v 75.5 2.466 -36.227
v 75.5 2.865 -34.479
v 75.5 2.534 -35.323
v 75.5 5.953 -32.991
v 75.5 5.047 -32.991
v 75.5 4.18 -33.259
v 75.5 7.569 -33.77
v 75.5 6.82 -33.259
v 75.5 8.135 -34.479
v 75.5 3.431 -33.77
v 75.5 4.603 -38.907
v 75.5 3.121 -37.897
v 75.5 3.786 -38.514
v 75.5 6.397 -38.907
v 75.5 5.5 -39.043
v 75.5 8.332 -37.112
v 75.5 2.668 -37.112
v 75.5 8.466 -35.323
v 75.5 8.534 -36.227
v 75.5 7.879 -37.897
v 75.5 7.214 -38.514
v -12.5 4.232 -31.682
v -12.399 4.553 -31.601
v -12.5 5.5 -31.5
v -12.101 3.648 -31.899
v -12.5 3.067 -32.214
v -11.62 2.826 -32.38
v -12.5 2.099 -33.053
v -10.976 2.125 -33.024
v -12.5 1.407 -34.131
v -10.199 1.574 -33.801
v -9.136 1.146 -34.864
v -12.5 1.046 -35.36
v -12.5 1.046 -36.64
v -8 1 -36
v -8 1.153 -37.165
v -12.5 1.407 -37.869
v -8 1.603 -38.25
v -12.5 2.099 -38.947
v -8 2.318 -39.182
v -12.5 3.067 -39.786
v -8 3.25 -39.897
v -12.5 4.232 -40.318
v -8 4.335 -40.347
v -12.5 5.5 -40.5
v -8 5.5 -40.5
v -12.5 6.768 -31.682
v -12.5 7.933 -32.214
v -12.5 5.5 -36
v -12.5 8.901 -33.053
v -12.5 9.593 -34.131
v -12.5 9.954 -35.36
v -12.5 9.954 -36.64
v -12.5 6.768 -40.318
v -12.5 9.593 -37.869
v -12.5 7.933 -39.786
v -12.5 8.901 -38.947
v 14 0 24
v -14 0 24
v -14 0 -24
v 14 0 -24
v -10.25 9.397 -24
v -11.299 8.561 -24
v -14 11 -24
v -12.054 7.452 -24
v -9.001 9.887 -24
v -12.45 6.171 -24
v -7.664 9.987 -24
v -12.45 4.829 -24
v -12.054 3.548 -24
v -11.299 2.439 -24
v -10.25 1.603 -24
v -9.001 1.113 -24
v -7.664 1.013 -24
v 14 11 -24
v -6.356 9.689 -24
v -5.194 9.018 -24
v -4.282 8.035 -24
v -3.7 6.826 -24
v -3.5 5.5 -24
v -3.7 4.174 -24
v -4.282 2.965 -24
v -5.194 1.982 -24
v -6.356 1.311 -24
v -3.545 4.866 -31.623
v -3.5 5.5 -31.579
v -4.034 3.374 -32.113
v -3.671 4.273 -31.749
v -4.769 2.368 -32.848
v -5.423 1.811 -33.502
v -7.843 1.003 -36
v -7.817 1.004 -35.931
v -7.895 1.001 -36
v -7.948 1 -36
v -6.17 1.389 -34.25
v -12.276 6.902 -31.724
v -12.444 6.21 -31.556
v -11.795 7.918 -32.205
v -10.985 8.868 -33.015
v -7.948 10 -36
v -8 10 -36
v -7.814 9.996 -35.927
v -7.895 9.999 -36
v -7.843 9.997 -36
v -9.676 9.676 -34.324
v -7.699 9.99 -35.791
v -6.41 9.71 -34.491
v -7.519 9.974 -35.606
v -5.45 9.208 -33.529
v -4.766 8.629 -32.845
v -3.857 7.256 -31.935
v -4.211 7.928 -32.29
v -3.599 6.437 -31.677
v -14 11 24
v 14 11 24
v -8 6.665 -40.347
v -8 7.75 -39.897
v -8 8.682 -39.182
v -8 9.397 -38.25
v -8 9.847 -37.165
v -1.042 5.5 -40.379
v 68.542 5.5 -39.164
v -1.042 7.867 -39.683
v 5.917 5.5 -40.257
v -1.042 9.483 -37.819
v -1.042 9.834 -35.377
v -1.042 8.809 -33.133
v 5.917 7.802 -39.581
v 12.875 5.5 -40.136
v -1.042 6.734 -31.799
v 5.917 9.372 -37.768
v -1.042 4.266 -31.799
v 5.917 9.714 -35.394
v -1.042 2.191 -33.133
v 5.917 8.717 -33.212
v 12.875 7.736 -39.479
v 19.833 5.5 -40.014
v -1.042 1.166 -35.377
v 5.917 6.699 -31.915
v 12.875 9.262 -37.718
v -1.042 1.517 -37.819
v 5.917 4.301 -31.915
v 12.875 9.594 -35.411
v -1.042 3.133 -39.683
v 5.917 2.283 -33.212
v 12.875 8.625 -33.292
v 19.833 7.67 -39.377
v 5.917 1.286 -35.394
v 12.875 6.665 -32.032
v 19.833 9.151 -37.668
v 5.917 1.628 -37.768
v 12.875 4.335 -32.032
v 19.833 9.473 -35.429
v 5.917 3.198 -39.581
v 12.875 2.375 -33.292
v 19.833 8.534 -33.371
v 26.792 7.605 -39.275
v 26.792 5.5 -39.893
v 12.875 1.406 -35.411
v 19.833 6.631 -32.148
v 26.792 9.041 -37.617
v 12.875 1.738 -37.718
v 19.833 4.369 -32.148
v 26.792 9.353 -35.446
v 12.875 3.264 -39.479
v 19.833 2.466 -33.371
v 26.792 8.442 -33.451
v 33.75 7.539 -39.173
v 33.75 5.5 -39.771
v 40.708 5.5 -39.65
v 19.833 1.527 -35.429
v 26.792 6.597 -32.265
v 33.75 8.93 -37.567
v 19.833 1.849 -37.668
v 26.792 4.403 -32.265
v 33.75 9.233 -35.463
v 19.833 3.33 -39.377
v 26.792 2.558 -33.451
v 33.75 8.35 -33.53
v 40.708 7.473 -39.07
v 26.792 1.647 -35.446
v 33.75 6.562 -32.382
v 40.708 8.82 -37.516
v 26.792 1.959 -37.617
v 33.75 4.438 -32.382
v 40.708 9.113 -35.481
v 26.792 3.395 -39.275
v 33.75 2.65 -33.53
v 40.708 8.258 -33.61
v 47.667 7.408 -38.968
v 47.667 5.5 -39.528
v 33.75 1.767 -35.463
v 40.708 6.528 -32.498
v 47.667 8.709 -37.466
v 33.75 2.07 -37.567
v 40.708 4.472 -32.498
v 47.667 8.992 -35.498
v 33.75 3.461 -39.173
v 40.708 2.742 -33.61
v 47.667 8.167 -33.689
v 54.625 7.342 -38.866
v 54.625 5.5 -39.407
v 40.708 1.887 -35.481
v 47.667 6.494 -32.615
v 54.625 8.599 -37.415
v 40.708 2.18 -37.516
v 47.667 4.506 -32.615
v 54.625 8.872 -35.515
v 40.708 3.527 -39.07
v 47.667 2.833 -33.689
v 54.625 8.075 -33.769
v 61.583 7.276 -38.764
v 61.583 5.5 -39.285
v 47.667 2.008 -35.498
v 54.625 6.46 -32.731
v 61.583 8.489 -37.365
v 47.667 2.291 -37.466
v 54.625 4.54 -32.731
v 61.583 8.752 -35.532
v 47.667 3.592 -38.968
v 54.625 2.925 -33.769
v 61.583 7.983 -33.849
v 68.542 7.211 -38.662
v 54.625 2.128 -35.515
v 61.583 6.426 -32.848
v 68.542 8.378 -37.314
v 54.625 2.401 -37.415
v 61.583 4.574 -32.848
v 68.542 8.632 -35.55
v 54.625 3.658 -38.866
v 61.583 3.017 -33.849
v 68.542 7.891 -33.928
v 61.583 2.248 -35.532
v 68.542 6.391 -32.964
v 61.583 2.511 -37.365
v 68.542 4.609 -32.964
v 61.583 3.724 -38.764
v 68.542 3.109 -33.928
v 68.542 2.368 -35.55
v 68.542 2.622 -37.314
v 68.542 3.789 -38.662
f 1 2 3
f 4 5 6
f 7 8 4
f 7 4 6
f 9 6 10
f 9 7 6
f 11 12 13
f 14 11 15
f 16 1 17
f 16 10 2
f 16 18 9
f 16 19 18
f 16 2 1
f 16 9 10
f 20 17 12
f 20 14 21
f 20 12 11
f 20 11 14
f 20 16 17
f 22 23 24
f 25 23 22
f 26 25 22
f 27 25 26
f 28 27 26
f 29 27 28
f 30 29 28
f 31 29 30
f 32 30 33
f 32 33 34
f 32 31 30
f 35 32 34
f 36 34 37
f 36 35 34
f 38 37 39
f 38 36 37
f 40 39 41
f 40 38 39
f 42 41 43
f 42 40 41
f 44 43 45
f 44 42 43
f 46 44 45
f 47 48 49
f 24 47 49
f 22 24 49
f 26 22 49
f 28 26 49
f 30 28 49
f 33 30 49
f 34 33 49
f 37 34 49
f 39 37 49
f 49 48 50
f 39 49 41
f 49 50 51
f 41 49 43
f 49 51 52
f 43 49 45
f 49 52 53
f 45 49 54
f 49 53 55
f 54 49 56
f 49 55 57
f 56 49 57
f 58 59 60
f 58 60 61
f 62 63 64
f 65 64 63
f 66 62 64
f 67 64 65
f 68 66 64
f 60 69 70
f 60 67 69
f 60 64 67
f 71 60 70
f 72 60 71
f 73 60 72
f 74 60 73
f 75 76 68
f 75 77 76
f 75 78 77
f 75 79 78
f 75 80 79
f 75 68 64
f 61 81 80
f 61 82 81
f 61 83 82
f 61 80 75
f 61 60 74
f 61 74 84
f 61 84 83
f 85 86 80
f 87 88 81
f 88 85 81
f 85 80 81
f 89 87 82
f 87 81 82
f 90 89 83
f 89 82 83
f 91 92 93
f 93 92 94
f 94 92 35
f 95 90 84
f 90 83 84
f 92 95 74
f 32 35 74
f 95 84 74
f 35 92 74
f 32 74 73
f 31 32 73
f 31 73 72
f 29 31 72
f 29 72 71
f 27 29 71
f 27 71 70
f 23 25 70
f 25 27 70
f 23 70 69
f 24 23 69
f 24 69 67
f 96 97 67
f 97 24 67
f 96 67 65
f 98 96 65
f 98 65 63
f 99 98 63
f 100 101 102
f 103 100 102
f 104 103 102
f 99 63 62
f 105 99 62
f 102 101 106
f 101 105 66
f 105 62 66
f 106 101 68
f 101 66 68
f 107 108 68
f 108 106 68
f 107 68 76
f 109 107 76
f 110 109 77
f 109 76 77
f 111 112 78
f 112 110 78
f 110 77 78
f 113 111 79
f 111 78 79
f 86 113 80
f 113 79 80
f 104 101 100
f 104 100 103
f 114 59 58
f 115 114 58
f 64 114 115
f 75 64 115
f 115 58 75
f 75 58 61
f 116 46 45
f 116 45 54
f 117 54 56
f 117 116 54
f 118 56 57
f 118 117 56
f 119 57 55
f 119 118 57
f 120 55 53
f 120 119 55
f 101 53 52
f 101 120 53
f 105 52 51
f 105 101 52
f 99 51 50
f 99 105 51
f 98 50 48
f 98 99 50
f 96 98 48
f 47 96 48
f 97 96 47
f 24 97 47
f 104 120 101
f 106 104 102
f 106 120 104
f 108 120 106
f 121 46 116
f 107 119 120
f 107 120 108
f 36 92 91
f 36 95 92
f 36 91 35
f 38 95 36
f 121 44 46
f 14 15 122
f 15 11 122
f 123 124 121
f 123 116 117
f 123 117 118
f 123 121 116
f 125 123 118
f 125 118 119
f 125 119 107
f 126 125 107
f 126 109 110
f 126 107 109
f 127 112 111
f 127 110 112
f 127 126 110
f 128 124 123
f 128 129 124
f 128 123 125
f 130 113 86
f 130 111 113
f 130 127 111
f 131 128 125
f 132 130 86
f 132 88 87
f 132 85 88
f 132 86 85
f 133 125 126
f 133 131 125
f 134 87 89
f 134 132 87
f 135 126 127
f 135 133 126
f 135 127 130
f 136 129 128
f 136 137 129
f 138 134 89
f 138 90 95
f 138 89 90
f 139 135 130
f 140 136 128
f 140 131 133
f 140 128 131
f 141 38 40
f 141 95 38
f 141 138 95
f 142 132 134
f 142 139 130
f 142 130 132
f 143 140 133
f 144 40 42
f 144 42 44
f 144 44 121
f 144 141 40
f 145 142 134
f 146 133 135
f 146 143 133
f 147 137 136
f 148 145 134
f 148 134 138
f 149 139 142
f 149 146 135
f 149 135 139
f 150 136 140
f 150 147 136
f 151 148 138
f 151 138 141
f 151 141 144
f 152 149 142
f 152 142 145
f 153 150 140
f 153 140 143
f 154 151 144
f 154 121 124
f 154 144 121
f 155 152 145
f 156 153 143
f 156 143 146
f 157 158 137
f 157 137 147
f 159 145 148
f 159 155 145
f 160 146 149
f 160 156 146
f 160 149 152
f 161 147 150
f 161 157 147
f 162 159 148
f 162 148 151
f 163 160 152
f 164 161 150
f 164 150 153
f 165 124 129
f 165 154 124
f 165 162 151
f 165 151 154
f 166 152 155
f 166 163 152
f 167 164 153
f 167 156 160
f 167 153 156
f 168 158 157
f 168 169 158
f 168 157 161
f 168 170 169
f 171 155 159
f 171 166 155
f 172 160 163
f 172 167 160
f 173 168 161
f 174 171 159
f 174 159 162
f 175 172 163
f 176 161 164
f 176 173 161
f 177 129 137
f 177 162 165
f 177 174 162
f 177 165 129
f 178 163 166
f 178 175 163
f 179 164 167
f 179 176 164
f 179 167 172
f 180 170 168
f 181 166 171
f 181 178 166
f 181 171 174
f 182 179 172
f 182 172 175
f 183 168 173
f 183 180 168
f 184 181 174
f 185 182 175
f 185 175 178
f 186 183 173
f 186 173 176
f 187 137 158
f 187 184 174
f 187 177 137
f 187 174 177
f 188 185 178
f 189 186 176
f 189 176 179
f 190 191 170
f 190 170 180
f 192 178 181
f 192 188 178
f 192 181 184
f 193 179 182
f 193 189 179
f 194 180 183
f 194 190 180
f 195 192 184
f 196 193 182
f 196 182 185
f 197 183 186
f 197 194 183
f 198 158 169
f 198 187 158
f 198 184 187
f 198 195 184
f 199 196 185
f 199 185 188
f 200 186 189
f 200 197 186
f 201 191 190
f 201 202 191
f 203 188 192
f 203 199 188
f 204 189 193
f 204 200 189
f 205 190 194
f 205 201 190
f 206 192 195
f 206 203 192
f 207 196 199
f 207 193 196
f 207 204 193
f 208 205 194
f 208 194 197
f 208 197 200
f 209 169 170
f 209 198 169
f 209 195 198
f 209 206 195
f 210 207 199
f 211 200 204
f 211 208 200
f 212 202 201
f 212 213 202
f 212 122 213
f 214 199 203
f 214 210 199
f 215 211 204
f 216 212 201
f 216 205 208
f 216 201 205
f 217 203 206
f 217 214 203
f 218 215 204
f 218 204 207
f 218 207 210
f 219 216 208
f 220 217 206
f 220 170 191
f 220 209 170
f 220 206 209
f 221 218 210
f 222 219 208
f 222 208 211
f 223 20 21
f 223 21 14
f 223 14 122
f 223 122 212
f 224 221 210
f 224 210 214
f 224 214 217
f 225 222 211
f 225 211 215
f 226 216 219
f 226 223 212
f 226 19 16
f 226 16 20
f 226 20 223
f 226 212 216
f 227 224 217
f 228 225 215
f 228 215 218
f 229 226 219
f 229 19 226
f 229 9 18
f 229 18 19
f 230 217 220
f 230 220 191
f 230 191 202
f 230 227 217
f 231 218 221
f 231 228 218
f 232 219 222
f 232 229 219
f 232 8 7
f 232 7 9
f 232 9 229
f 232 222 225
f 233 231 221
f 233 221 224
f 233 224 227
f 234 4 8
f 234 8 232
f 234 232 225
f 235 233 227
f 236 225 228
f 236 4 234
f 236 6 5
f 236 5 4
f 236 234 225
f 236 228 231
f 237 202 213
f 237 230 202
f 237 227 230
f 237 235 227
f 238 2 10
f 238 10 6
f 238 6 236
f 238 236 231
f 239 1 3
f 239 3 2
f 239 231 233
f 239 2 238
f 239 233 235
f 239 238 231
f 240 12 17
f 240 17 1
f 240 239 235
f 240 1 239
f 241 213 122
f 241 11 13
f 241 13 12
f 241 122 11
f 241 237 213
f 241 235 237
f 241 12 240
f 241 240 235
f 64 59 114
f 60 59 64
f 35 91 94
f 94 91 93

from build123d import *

# Parameters (mm, degrees)
SCHIZZO1_W                             = 28
SCHIZZO1_H                             = 48
ESTRUSIONE_ESTRUSIONE1_DEPTH           = 11
SCHIZZO3_R                             = 4.5
ESTRUSIONE_ESTRUSIONE2_DEPTH           = 12
SCHIZZO4_R                             = 4.5
ESTRUSIONE_ESTRUSIONE3_DEPTH           = 83.5
ESTRUSIONE_ESTRUSIONE3_TAPER           = 1
ESTRUSIONE_ESTRUSIONE3_OTHER_WAY_DEPTH = 4.5


with BuildPart() as part:
    # Schizzo1 → Estrusione-Estrusione1 (new body)
    with BuildSketch(Plane(origin=(0, 0, 0), x_dir=(1, 0, 0), z_dir=(0, 1, 0))):
        Rectangle(SCHIZZO1_W, SCHIZZO1_H)
    extrude(amount=ESTRUSIONE_ESTRUSIONE1_DEPTH)

    # Schizzo3 → Estrusione-Estrusione2 (add)
    with BuildSketch(Plane(origin=(0, 0, -24), x_dir=(-1, 0, 0), z_dir=(0, 0, -1))):
        with Locations(Location((8, 5.5, 0), (0, 0, 180))):
            Circle(SCHIZZO3_R)
    extrude(amount=ESTRUSIONE_ESTRUSIONE2_DEPTH)

    # Schizzo4 → Estrusione-Estrusione3 (add)
    with BuildSketch(Plane(origin=(-8, 0, 0), x_dir=(0, 0, -1), z_dir=(1, 0, 0))):
        with Locations((36, 5.5)):
            Circle(SCHIZZO4_R)
    extrude(amount=ESTRUSIONE_ESTRUSIONE3_DEPTH, taper=ESTRUSIONE_ESTRUSIONE3_TAPER)

    # Schizzo4 → Estrusione-Estrusione3 other way (add)
    with BuildSketch(Plane(origin=(-8, 0, 0), x_dir=(0, 0, -1), z_dir=(1, 0, 0))):
        with Locations((36, 5.5)):
            Circle(SCHIZZO4_R)
    extrude(amount=-ESTRUSIONE_ESTRUSIONE3_OTHER_WAY_DEPTH)


solid = part.part
